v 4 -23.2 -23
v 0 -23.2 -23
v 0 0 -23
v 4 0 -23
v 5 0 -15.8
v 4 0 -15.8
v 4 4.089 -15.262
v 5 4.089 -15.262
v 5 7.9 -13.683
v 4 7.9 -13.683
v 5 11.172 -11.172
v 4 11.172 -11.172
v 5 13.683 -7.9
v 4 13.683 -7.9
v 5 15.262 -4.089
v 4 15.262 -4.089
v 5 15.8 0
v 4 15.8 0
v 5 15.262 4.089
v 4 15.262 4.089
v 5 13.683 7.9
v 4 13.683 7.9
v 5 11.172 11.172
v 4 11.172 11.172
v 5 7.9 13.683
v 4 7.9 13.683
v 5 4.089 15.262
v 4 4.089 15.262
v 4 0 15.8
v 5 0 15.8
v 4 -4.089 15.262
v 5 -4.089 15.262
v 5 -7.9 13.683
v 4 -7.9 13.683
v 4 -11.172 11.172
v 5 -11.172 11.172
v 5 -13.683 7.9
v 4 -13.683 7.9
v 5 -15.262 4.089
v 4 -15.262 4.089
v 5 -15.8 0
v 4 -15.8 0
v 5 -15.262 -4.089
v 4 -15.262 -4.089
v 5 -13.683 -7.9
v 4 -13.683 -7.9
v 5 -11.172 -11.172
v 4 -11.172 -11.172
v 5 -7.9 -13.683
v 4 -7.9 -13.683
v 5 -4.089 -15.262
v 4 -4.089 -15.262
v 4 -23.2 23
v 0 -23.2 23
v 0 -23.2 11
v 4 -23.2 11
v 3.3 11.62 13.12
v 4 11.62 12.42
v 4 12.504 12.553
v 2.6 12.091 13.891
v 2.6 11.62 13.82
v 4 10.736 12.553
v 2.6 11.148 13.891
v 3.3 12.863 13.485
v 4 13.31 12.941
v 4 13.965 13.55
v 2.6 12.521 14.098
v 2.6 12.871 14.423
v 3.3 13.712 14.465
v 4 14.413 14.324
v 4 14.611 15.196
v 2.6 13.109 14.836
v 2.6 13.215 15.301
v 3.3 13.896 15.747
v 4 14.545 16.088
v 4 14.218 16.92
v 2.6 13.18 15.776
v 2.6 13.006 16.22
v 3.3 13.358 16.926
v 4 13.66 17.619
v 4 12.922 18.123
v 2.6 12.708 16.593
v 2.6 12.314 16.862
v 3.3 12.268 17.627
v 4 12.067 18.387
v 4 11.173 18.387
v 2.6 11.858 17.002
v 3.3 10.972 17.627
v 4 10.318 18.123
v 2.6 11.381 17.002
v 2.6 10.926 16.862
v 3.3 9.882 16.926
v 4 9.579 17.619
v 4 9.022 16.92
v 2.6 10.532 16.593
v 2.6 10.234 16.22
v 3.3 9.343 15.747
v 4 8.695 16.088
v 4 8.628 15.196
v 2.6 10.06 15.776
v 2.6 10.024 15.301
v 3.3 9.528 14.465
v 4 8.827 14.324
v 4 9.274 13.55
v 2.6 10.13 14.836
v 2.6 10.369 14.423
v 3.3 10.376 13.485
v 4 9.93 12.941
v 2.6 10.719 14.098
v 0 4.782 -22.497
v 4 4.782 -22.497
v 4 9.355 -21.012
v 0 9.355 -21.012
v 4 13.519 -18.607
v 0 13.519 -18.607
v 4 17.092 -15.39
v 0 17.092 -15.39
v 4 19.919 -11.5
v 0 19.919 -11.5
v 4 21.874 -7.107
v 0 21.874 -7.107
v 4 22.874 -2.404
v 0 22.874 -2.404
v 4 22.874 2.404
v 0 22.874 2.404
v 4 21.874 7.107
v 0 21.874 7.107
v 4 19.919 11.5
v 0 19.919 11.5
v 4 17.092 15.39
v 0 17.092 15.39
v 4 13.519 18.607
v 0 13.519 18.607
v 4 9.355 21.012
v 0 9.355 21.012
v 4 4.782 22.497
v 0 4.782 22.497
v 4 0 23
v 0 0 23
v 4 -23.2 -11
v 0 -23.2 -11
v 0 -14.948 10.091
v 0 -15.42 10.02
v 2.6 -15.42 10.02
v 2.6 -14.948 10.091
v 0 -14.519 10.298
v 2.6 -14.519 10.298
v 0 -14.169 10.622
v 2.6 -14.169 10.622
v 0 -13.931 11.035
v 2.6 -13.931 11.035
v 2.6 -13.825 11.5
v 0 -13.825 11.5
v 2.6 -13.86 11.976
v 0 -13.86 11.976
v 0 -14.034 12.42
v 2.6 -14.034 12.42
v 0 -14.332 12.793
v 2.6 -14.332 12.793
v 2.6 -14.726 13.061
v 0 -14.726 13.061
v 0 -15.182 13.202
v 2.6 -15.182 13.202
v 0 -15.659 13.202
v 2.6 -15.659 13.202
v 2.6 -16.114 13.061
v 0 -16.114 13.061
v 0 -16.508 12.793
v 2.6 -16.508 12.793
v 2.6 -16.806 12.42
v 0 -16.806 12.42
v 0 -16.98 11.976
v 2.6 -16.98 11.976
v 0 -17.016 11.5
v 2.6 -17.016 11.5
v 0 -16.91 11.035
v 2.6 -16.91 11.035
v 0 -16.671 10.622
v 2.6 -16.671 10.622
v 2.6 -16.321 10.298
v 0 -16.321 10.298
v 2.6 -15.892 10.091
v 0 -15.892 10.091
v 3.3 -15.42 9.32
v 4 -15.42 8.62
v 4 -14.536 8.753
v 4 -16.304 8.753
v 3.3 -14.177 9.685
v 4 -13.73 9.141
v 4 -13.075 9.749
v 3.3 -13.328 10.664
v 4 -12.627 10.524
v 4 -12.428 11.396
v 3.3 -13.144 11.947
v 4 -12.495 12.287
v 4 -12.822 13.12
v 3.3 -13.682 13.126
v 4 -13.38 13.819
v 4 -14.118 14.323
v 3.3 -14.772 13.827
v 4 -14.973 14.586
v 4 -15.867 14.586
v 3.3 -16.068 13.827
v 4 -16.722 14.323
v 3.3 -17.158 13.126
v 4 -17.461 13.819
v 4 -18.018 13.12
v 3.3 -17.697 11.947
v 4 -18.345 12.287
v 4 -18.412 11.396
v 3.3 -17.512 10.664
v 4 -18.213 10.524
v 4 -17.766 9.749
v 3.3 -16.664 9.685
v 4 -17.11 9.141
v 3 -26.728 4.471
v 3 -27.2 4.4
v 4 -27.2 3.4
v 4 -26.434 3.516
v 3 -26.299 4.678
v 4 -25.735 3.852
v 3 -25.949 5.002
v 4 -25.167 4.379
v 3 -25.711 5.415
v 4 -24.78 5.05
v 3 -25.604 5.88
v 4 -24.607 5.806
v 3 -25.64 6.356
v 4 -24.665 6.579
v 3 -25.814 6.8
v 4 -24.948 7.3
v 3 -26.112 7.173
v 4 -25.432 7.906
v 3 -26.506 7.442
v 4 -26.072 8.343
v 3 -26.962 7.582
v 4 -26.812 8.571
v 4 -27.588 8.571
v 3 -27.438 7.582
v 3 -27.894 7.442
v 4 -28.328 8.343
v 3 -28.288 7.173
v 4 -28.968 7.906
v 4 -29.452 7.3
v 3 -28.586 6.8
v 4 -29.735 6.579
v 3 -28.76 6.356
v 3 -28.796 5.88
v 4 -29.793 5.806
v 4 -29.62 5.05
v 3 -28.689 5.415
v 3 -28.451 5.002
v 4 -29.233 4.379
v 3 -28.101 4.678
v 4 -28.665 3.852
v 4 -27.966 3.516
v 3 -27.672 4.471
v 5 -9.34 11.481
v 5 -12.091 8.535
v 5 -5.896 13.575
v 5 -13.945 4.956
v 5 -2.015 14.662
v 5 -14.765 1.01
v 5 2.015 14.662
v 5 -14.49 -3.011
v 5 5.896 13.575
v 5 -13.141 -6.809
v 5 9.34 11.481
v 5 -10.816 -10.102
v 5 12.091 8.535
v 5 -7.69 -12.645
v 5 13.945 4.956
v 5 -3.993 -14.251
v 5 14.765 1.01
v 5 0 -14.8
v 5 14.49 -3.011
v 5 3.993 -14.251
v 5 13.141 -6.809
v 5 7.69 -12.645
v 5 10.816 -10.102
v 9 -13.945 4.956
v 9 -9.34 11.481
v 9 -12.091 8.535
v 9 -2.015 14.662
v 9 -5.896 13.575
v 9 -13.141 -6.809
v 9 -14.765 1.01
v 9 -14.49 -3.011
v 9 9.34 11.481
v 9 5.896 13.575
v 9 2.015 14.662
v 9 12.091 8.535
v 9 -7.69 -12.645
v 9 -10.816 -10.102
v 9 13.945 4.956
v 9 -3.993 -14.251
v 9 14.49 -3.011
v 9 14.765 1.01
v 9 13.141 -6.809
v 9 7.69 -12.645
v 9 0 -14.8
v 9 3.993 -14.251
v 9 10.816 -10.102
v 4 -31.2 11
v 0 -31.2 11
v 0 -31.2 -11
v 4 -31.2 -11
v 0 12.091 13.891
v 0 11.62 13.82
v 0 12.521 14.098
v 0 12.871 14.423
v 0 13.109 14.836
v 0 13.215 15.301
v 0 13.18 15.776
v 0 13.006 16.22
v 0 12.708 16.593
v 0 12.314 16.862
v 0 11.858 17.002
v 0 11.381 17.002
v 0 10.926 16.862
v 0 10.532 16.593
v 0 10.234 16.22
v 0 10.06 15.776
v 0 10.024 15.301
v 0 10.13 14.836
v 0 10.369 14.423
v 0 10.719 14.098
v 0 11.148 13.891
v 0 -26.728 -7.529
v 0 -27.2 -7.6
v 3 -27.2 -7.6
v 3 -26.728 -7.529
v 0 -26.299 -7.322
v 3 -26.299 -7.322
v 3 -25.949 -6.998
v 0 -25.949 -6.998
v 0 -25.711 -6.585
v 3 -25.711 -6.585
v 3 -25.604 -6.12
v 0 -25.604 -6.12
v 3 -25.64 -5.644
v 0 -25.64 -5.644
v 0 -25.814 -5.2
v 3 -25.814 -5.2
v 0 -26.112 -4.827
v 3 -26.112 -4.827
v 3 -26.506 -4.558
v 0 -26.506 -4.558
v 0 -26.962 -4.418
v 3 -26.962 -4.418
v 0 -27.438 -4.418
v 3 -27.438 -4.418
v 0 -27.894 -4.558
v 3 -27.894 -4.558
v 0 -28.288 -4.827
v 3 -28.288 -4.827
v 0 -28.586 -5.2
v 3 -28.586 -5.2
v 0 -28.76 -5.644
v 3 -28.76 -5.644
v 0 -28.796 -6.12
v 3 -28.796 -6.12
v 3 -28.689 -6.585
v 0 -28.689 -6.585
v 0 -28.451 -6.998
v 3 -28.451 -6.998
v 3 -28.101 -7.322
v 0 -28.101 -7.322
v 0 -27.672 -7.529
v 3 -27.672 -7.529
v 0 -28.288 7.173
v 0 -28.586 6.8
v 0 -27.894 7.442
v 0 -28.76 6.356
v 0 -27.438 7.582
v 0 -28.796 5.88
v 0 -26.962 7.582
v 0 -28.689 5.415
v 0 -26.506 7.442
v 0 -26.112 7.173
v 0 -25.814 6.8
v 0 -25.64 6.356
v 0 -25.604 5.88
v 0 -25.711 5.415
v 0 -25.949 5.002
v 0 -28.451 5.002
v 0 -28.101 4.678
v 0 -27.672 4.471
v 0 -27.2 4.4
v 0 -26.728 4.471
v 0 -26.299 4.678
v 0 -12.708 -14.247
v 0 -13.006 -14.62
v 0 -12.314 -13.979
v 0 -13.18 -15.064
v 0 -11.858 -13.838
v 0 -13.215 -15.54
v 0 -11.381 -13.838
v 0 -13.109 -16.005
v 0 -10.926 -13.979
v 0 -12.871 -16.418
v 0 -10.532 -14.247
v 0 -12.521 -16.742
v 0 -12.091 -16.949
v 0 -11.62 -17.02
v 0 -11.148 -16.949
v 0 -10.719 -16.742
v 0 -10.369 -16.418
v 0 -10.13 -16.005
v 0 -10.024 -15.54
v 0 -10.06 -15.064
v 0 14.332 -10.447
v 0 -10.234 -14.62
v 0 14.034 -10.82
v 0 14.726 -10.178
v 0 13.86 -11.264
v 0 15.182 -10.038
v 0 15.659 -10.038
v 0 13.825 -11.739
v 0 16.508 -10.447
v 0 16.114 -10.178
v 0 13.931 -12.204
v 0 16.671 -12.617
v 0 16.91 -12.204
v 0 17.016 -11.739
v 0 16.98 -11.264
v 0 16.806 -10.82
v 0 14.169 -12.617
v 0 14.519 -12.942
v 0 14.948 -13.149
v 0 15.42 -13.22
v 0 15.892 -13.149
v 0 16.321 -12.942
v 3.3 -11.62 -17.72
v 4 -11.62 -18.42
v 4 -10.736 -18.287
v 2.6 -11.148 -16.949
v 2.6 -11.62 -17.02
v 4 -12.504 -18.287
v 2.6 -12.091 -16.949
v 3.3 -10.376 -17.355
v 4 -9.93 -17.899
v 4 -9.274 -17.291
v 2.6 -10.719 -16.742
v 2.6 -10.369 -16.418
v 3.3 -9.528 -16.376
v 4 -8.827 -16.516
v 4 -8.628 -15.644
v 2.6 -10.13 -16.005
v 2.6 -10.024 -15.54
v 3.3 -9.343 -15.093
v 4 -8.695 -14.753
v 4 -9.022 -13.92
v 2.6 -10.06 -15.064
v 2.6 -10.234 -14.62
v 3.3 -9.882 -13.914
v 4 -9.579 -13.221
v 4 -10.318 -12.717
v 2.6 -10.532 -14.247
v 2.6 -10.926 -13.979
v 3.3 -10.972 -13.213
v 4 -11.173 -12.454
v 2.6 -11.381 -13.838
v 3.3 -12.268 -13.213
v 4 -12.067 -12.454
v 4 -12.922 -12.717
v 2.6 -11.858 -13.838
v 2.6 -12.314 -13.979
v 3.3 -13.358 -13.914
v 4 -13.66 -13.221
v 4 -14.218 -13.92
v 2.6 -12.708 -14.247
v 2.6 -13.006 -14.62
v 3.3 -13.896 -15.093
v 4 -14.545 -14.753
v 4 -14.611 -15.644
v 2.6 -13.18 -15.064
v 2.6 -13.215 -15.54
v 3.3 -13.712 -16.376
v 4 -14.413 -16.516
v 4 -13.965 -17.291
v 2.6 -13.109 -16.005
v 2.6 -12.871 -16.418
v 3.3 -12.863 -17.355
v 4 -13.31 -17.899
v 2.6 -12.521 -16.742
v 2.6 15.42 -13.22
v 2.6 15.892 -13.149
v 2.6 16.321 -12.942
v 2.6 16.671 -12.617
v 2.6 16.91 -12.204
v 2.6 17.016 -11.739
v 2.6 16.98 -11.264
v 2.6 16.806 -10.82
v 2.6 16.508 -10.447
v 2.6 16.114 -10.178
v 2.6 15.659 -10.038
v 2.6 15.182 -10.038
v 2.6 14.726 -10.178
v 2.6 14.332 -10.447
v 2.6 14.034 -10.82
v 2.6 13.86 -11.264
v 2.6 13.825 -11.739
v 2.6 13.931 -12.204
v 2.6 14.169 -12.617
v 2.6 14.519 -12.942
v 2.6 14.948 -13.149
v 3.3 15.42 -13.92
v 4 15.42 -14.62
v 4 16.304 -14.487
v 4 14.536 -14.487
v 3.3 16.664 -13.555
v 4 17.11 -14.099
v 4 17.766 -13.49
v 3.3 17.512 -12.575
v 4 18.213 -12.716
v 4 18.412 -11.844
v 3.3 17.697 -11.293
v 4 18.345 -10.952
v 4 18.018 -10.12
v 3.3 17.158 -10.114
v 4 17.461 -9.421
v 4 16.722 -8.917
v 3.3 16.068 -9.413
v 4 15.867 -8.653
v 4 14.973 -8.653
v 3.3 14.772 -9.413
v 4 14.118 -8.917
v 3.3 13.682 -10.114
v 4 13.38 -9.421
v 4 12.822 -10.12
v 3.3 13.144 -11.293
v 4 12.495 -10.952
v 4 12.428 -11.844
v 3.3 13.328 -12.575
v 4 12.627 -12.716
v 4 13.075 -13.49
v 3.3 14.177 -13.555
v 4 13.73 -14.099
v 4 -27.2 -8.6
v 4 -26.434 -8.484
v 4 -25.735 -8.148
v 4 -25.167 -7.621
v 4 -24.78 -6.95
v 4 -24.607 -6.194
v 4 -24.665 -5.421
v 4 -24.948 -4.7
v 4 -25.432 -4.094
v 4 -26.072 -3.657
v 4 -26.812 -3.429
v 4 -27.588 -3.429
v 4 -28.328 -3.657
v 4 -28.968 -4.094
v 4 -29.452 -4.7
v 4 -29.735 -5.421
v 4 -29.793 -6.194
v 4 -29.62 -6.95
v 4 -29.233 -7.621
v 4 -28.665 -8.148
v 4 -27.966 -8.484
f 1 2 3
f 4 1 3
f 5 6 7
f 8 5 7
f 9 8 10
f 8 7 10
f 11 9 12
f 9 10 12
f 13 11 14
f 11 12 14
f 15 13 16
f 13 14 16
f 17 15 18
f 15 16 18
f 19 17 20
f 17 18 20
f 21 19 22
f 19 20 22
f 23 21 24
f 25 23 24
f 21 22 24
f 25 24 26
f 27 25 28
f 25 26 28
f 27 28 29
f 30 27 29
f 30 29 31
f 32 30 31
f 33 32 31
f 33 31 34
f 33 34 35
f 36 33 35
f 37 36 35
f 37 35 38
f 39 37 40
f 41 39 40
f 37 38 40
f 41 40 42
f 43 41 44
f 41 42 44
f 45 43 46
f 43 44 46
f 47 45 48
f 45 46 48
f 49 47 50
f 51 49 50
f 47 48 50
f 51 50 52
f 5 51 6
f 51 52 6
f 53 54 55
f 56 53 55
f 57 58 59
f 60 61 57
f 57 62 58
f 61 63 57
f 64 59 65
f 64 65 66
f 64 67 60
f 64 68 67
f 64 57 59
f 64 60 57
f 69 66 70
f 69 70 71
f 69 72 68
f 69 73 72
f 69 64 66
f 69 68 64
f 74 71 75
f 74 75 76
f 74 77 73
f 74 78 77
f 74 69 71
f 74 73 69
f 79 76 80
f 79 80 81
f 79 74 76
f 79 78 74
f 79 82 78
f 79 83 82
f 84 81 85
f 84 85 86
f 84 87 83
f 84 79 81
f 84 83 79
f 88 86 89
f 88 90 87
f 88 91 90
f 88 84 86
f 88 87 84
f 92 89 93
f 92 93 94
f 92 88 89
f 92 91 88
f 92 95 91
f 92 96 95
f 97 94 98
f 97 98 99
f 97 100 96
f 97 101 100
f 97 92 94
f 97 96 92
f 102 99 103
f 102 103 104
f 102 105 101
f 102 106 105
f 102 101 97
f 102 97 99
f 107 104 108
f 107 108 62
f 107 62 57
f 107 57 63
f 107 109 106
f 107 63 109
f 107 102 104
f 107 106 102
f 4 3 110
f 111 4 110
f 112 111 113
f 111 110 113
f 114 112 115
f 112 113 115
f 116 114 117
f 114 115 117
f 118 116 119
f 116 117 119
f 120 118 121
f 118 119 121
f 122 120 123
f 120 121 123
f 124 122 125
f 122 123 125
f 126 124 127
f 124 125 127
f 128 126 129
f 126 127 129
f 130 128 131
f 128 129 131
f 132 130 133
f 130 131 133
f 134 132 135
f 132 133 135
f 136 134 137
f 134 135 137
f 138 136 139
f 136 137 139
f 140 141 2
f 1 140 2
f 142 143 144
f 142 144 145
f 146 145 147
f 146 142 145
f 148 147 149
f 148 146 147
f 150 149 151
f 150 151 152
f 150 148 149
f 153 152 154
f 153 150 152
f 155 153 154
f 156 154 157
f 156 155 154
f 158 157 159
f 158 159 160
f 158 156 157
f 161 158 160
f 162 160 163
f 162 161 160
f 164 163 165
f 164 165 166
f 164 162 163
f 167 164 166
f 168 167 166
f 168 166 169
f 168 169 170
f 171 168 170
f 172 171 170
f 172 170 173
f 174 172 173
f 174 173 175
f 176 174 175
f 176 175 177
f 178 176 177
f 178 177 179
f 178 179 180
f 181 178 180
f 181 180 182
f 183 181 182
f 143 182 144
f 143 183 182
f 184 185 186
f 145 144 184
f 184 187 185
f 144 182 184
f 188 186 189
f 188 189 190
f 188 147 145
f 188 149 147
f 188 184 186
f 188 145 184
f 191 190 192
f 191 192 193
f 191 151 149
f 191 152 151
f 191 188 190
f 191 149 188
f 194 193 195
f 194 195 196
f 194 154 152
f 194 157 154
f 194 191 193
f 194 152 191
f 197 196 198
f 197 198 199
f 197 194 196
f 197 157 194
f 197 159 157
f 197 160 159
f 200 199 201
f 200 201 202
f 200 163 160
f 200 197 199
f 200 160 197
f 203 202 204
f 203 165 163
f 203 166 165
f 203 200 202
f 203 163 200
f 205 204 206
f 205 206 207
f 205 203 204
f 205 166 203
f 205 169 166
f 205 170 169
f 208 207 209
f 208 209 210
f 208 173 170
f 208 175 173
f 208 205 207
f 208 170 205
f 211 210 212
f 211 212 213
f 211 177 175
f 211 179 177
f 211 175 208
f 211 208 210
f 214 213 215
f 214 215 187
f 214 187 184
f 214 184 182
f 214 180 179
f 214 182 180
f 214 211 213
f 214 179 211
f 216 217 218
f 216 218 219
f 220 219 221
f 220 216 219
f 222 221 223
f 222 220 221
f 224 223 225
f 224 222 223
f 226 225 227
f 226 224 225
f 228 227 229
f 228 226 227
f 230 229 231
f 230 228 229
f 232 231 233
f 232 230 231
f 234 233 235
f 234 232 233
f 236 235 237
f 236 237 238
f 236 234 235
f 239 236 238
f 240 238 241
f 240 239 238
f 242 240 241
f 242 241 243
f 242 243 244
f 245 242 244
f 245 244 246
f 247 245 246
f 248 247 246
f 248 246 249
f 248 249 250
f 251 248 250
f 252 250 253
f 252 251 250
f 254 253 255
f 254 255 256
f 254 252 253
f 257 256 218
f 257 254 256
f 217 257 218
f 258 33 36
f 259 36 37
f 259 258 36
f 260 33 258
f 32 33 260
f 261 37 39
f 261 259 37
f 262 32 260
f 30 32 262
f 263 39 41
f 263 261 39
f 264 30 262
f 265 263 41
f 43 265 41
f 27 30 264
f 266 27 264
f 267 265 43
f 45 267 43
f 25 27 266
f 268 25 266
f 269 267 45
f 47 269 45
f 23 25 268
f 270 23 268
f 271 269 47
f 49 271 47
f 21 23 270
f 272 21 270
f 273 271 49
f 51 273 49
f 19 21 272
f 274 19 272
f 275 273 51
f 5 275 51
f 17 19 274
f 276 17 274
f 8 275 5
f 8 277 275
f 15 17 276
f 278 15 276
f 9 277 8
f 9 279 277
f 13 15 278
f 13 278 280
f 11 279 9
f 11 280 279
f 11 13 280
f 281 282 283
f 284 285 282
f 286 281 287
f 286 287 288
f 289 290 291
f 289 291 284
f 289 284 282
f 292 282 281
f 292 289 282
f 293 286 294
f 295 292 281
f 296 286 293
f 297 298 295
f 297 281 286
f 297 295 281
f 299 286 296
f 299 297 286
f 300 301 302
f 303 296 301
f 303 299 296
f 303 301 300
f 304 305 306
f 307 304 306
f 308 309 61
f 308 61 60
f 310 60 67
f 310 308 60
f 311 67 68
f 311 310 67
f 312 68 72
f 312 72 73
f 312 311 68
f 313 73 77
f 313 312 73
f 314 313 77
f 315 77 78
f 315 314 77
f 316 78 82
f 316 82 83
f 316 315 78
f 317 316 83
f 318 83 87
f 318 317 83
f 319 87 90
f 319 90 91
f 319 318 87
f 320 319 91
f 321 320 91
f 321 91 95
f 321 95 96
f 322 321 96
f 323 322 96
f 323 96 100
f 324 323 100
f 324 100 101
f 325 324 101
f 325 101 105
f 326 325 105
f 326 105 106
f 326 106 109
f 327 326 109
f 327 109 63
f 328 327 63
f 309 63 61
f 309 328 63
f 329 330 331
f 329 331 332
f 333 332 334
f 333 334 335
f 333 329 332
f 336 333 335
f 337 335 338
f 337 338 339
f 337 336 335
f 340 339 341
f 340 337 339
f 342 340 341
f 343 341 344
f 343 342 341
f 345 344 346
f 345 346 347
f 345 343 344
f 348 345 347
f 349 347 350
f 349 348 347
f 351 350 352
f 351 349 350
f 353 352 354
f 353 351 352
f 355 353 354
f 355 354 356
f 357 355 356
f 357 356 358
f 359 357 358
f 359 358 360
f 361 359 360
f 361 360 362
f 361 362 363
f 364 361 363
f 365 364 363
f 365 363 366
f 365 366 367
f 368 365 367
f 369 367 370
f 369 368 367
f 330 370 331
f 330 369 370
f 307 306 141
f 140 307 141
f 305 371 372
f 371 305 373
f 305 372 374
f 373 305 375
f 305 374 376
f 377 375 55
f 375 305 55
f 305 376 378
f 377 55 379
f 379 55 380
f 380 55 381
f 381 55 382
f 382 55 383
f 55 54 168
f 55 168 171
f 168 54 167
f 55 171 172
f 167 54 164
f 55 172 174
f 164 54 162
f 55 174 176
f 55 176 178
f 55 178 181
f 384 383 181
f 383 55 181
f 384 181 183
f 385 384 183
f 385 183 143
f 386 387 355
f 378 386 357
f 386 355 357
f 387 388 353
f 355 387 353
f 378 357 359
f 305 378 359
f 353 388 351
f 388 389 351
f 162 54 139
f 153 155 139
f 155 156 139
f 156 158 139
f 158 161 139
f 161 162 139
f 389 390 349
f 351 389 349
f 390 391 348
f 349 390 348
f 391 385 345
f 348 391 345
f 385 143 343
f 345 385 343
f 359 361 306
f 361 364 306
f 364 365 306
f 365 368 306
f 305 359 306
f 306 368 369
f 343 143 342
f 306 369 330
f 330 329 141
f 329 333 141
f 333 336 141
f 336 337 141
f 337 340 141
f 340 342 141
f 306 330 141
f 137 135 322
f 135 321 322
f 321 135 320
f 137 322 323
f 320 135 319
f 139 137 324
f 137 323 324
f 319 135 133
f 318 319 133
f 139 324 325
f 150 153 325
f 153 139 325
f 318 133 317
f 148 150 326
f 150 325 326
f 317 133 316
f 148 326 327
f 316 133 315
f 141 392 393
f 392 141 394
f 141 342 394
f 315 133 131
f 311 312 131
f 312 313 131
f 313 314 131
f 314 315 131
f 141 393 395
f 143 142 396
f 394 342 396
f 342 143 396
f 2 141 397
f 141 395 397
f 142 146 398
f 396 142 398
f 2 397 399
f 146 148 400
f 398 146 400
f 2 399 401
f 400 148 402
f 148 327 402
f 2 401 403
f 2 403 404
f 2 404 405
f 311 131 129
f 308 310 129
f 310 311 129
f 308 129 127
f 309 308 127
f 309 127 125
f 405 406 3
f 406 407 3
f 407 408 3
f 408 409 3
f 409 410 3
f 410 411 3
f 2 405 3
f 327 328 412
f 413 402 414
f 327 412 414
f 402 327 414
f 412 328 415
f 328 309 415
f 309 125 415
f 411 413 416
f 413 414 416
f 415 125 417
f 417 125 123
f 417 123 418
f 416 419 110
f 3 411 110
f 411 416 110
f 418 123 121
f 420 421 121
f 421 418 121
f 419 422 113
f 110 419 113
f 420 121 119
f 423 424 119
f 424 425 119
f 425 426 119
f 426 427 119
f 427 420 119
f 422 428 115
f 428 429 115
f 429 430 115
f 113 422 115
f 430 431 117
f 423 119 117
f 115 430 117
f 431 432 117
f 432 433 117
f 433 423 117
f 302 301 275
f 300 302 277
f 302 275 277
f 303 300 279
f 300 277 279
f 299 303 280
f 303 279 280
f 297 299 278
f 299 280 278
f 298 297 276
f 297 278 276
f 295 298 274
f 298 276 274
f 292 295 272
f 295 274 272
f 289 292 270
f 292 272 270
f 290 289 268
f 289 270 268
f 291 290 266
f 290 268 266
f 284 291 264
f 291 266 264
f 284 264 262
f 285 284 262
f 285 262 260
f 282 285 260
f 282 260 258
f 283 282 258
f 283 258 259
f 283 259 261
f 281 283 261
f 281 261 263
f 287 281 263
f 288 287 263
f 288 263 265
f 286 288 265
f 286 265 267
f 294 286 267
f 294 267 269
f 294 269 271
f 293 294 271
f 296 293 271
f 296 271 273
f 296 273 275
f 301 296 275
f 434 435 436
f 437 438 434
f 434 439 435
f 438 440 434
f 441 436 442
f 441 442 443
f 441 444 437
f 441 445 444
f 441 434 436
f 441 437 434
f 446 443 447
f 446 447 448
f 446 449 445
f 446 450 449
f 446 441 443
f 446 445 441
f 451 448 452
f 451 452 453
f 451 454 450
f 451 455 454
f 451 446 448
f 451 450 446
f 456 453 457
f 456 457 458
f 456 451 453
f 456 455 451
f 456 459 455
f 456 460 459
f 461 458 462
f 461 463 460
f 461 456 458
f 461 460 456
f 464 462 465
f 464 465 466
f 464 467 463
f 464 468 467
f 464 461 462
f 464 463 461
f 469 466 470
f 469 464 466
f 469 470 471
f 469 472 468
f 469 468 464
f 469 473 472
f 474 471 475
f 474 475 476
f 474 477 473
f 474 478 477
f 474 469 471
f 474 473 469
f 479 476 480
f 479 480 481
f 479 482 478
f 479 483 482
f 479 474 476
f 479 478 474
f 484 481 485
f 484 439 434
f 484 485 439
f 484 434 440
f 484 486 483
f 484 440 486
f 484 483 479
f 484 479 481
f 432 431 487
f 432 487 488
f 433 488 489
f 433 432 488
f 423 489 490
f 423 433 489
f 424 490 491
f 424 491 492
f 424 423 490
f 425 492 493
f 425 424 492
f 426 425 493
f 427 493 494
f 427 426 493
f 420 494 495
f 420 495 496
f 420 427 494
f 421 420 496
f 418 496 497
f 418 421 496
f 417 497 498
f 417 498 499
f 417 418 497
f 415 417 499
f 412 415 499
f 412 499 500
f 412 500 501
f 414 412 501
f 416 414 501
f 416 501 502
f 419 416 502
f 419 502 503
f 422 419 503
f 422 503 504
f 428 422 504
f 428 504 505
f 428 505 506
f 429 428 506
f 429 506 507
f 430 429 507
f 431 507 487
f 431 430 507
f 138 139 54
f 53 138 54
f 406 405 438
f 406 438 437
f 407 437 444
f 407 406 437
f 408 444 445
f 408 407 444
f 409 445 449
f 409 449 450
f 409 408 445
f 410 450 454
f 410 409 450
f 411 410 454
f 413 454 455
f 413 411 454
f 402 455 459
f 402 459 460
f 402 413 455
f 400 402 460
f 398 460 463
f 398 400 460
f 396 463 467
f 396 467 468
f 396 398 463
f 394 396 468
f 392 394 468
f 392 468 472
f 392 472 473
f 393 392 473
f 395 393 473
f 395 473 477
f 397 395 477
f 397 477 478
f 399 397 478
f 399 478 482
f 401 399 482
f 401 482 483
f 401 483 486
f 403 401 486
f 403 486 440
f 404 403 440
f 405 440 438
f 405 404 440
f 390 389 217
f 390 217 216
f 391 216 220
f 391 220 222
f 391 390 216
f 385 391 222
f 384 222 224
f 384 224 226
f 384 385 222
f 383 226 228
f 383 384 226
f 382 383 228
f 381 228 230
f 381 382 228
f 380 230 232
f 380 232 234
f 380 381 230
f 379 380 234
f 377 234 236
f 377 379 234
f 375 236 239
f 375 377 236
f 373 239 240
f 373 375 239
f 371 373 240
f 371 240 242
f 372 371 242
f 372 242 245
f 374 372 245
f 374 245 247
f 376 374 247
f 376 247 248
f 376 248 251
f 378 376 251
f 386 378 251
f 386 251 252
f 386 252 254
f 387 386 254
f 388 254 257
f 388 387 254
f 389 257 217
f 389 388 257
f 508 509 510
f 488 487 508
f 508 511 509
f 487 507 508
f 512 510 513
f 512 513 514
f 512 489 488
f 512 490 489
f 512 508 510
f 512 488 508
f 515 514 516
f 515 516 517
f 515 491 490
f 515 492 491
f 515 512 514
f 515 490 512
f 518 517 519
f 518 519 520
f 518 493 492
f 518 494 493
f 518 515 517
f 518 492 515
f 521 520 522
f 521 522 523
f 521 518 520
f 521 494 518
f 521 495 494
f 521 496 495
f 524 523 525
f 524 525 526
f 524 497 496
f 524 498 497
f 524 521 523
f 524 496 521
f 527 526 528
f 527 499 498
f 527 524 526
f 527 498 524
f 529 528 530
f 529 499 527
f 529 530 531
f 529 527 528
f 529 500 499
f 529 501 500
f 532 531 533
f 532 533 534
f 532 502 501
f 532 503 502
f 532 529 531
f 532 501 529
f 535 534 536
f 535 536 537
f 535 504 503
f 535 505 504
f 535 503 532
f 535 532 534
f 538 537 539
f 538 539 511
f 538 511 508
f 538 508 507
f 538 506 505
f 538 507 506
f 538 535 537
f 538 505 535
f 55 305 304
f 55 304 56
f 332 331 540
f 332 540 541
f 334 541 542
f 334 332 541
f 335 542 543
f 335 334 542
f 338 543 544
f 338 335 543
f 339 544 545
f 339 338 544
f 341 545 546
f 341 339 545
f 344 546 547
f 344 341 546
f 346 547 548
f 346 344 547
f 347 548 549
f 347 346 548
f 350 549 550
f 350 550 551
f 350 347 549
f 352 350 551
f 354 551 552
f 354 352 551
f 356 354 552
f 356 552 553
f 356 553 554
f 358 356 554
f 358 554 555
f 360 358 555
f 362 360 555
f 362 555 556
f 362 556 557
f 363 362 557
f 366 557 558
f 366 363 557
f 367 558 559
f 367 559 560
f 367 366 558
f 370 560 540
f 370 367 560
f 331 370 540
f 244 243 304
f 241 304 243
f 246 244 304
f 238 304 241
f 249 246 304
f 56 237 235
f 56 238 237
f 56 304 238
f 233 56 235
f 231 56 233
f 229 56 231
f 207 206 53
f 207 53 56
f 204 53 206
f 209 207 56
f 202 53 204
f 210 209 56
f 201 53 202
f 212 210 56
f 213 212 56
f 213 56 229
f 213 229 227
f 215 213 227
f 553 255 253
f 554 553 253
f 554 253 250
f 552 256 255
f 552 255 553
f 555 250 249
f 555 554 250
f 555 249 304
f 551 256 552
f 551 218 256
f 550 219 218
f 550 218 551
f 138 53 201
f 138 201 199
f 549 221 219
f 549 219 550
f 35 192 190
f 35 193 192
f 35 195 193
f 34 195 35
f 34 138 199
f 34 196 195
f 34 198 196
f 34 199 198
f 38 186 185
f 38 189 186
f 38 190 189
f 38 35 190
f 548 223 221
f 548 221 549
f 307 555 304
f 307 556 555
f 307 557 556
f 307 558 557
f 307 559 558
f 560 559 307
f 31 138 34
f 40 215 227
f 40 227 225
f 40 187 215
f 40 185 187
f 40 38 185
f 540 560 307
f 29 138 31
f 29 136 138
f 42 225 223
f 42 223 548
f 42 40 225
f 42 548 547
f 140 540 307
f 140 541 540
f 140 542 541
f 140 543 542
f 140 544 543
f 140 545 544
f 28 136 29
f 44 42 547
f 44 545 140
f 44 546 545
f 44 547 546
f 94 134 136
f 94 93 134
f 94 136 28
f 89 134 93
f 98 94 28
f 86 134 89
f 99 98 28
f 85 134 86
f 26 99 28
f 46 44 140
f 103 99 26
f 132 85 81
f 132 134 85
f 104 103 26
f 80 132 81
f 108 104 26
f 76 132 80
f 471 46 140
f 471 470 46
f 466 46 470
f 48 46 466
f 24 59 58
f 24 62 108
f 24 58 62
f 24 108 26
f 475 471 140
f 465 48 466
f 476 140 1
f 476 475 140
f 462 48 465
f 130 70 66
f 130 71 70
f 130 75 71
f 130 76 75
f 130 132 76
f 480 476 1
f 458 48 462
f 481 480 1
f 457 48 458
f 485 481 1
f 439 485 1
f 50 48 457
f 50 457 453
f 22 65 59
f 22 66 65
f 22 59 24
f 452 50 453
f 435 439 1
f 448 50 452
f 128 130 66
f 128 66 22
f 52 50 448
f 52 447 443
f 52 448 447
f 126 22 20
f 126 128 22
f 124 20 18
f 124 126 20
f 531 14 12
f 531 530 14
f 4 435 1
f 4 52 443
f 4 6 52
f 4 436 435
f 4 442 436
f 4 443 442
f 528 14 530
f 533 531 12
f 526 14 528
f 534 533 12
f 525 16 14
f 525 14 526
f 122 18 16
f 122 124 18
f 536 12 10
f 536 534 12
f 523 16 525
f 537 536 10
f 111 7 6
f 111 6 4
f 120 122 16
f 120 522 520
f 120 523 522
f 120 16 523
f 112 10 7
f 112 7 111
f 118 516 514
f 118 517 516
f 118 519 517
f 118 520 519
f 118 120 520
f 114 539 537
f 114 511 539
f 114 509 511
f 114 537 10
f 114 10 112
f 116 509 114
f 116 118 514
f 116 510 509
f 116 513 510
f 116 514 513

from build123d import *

# Parameters (mm, degrees)
SKETCH_1_R      = 1.6
SKETCH_1_R_2    = 14.8
EXTRUDE_4_DEPTH = 4
SKETCH_1_6_W    = 22
SKETCH_1_6_H    = 8
SKETCH_1_6_R    = 1.6
EXTRUDE_5_DEPTH = 4
CHAMFER_1_SIZE  = 1.4
CHAMFER_2_SIZE  = 1
CHAMFER_3_SIZE  = 1
SKETCH_1_7_R    = 14.8
EXTRUDE_6_DEPTH = 9
SKETCH_2_R      = 15.8
EXTRUDE_7_DEPTH = 1


with BuildPart() as part:
    # 草图1 → 凸台-拉伸4 (new body)
    with BuildSketch(Plane(origin=(0, 0, 0), x_dir=(0, 0, -1), z_dir=(1, 0, 0))):
        with BuildLine():
            Line((23, -23.2), (23, 0))
            ThreePointArc((23, 0), (0, 23), (-23, 0))
            Line((-23, 0), (-23, -23.2))
            Line((-23, -23.2), (23, -23.2))
        make_face()
        with Locations((11.619884993, 15.420108208)):
            Circle(SKETCH_1_R, mode=Mode.SUBTRACT)
        with Locations((-11.619884993, -15.420108208)):
            Circle(SKETCH_1_R, mode=Mode.SUBTRACT)
        with Locations((15.420108208, -11.619884993)):
            Circle(SKETCH_1_R, mode=Mode.SUBTRACT)
        with Locations((-15.420108208, 11.619884993)):
            Circle(SKETCH_1_R, mode=Mode.SUBTRACT)
        Circle(SKETCH_1_R_2, mode=Mode.SUBTRACT)
    extrude(amount=EXTRUDE_4_DEPTH)

    # 草图1<6> → 凸台-拉伸5 (add)
    with BuildSketch(Plane(origin=(0, 0, 0), x_dir=(0, 0, -1), z_dir=(1, 0, 0))):
        with Locations((0, -27.2)):
            Rectangle(SKETCH_1_6_W, SKETCH_1_6_H)
        with Locations((-6, -27.2)):
            Circle(SKETCH_1_6_R, mode=Mode.SUBTRACT)
        with Locations((6, -27.2)):
            Circle(SKETCH_1_6_R, mode=Mode.SUBTRACT)
    extrude(amount=EXTRUDE_5_DEPTH)

    # 倒角1
    chamfer_1_edges = [part.edges().sort_by_distance(p)[0] for p in [
        (4, -15.420108208, 13.219884993),
        (4, -11.619884993, -13.820108208),
        (4, 15.420108208, -10.019884993),
        (4, 11.619884993, 17.020108208),
    ]]
    chamfer(chamfer_1_edges, length=CHAMFER_1_SIZE)

    # 倒角2
    chamfer_2_edges = [part.edges().sort_by_distance(p)[0] for p in [
        (4, -27.2, 7.6),
    ]]
    chamfer(chamfer_2_edges, length=CHAMFER_2_SIZE)

    # 倒角3
    chamfer_3_edges = [part.edges().sort_by_distance(p)[0] for p in [
        (4, -27.2, -4.4),
    ]]
    chamfer(chamfer_3_edges, length=CHAMFER_3_SIZE)

    # 草图1<7> → 凸台-拉伸6 (add)
    with BuildSketch(Plane(origin=(0, 0, 0), x_dir=(0, 0, -1), z_dir=(1, 0, 0))):
        Circle(SKETCH_1_7_R)
    extrude(amount=EXTRUDE_6_DEPTH)

    # 草图2 → 凸台-拉伸7 (add)
    with BuildSketch(Plane(origin=(4, 0, 0), x_dir=(0, 0, -1), z_dir=(1, 0, 0))):
        Circle(SKETCH_2_R)
    extrude(amount=EXTRUDE_7_DEPTH)


solid = part.part
